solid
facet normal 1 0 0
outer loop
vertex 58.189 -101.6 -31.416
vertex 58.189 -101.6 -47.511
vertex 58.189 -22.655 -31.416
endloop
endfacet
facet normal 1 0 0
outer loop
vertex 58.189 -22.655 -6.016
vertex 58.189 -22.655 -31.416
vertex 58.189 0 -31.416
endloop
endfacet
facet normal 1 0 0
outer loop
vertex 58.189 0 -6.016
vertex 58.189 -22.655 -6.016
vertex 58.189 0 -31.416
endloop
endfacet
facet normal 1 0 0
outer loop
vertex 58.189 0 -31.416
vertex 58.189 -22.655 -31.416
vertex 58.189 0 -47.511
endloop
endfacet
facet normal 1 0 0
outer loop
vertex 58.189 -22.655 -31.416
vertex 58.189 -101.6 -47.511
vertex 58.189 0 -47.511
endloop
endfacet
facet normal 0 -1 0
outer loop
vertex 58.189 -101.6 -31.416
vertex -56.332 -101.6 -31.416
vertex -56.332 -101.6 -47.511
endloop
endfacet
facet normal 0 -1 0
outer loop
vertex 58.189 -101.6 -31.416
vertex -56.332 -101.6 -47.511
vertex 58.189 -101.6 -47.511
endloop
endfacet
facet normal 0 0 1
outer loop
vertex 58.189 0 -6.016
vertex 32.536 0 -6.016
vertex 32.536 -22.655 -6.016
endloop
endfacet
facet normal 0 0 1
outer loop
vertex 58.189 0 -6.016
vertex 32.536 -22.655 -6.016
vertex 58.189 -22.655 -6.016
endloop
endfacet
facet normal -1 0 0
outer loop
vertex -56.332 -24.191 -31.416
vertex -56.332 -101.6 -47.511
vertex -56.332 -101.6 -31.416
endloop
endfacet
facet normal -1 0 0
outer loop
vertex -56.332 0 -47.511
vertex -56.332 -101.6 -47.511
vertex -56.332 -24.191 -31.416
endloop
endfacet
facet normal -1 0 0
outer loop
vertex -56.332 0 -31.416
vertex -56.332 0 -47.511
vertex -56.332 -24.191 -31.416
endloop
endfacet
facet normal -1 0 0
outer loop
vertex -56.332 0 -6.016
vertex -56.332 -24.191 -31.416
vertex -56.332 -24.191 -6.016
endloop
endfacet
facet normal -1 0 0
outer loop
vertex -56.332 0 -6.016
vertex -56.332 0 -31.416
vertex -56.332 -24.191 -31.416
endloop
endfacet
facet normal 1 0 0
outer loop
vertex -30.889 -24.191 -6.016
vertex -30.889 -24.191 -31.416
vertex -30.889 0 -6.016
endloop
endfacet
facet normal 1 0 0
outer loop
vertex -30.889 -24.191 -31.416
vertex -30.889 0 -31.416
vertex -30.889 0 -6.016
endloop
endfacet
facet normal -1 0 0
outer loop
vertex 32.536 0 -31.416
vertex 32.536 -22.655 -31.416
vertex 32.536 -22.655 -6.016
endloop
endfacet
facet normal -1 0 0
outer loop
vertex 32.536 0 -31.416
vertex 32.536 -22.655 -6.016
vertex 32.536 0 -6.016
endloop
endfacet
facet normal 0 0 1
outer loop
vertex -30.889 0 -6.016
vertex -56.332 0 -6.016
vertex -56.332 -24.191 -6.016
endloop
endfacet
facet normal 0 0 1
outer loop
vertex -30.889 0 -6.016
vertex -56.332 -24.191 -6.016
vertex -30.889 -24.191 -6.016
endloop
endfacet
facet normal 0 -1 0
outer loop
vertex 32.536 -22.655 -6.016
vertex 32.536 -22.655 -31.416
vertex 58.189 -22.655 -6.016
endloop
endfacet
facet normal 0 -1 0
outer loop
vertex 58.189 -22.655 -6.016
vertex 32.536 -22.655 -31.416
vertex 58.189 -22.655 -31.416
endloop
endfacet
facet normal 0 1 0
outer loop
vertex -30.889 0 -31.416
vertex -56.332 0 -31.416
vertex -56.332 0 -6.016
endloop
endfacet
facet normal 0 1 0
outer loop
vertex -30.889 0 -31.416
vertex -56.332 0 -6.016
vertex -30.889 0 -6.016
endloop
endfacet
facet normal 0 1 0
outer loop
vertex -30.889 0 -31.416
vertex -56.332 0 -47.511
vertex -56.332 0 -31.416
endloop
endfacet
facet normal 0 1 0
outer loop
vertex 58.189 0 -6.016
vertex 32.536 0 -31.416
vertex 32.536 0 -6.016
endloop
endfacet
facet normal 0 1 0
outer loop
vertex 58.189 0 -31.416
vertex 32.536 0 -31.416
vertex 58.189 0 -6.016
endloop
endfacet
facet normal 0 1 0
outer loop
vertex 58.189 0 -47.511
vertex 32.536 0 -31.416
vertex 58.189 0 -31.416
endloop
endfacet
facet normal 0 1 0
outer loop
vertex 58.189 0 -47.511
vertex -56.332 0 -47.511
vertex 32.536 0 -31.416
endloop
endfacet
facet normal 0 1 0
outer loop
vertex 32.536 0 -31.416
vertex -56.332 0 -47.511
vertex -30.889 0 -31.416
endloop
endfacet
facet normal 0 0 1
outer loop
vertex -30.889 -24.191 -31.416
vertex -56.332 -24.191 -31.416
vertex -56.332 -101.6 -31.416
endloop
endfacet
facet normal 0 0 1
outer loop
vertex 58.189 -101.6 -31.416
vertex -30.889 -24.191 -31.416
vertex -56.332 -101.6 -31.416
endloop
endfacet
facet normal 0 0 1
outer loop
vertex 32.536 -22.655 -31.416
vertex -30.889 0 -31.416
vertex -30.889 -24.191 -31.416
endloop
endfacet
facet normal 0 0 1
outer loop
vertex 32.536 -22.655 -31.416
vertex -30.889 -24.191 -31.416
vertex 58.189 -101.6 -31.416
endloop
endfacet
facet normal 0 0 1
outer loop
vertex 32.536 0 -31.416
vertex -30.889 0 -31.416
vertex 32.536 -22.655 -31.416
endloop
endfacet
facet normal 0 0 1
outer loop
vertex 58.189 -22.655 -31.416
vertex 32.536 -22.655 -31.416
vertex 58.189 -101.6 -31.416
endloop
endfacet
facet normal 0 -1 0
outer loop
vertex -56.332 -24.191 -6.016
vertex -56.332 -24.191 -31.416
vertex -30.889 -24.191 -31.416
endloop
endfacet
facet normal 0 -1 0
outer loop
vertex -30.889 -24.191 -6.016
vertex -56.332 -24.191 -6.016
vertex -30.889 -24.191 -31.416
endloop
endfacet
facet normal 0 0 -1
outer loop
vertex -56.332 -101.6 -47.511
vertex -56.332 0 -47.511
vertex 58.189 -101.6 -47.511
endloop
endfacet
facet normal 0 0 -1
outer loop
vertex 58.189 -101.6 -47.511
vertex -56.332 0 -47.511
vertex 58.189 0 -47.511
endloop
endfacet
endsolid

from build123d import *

# Parameters (mm, degrees)
F0_W     = 114.5210824907
F0_H     = 16.0948559642
F1_DEPTH = 101.6
F2_W     = 25.6531313062
F2_H     = 22.6550512016
F3_DEPTH = 25.4
F4_W     = 25.4432931542
F4_H     = 15.3012713417
F5_DEPTH = 25.4
F6_DEPTH = 8.89


with BuildPart() as f1:
    # F0 (on Front) → F1 (new body)
    with BuildSketch(Plane.XZ):
        with Locations((0.928549096, -39.4633449614)):
            Rectangle(F0_W, F0_H)
    extrude(amount=F1_DEPTH)

    # F2 (on face) → F3 (join)
    with BuildSketch(Plane.XY.offset(-31.4159169793)):
        with Locations((45.3625246882, -11.3275256008)):
            Rectangle(F2_W, F2_H)
    extrude(amount=F3_DEPTH)

    # F4 (on face) → F5 (join)
    with BuildSketch(Plane.XY.offset(-31.4159169793)):
        with Locations((-43.6103455722, -7.6506356709)):
            Rectangle(F4_W, F4_H)
    extrude(amount=F5_DEPTH)

    # F6 (add): a face of the model
    f6_faces = [f1.faces().sort_by_distance(p)[0] for p in [
        (-43.6103455722, -15.3012713417, -18.7159169793),
    ]]
    extrude(f6_faces, amount=F6_DEPTH)


solid = f1.part
